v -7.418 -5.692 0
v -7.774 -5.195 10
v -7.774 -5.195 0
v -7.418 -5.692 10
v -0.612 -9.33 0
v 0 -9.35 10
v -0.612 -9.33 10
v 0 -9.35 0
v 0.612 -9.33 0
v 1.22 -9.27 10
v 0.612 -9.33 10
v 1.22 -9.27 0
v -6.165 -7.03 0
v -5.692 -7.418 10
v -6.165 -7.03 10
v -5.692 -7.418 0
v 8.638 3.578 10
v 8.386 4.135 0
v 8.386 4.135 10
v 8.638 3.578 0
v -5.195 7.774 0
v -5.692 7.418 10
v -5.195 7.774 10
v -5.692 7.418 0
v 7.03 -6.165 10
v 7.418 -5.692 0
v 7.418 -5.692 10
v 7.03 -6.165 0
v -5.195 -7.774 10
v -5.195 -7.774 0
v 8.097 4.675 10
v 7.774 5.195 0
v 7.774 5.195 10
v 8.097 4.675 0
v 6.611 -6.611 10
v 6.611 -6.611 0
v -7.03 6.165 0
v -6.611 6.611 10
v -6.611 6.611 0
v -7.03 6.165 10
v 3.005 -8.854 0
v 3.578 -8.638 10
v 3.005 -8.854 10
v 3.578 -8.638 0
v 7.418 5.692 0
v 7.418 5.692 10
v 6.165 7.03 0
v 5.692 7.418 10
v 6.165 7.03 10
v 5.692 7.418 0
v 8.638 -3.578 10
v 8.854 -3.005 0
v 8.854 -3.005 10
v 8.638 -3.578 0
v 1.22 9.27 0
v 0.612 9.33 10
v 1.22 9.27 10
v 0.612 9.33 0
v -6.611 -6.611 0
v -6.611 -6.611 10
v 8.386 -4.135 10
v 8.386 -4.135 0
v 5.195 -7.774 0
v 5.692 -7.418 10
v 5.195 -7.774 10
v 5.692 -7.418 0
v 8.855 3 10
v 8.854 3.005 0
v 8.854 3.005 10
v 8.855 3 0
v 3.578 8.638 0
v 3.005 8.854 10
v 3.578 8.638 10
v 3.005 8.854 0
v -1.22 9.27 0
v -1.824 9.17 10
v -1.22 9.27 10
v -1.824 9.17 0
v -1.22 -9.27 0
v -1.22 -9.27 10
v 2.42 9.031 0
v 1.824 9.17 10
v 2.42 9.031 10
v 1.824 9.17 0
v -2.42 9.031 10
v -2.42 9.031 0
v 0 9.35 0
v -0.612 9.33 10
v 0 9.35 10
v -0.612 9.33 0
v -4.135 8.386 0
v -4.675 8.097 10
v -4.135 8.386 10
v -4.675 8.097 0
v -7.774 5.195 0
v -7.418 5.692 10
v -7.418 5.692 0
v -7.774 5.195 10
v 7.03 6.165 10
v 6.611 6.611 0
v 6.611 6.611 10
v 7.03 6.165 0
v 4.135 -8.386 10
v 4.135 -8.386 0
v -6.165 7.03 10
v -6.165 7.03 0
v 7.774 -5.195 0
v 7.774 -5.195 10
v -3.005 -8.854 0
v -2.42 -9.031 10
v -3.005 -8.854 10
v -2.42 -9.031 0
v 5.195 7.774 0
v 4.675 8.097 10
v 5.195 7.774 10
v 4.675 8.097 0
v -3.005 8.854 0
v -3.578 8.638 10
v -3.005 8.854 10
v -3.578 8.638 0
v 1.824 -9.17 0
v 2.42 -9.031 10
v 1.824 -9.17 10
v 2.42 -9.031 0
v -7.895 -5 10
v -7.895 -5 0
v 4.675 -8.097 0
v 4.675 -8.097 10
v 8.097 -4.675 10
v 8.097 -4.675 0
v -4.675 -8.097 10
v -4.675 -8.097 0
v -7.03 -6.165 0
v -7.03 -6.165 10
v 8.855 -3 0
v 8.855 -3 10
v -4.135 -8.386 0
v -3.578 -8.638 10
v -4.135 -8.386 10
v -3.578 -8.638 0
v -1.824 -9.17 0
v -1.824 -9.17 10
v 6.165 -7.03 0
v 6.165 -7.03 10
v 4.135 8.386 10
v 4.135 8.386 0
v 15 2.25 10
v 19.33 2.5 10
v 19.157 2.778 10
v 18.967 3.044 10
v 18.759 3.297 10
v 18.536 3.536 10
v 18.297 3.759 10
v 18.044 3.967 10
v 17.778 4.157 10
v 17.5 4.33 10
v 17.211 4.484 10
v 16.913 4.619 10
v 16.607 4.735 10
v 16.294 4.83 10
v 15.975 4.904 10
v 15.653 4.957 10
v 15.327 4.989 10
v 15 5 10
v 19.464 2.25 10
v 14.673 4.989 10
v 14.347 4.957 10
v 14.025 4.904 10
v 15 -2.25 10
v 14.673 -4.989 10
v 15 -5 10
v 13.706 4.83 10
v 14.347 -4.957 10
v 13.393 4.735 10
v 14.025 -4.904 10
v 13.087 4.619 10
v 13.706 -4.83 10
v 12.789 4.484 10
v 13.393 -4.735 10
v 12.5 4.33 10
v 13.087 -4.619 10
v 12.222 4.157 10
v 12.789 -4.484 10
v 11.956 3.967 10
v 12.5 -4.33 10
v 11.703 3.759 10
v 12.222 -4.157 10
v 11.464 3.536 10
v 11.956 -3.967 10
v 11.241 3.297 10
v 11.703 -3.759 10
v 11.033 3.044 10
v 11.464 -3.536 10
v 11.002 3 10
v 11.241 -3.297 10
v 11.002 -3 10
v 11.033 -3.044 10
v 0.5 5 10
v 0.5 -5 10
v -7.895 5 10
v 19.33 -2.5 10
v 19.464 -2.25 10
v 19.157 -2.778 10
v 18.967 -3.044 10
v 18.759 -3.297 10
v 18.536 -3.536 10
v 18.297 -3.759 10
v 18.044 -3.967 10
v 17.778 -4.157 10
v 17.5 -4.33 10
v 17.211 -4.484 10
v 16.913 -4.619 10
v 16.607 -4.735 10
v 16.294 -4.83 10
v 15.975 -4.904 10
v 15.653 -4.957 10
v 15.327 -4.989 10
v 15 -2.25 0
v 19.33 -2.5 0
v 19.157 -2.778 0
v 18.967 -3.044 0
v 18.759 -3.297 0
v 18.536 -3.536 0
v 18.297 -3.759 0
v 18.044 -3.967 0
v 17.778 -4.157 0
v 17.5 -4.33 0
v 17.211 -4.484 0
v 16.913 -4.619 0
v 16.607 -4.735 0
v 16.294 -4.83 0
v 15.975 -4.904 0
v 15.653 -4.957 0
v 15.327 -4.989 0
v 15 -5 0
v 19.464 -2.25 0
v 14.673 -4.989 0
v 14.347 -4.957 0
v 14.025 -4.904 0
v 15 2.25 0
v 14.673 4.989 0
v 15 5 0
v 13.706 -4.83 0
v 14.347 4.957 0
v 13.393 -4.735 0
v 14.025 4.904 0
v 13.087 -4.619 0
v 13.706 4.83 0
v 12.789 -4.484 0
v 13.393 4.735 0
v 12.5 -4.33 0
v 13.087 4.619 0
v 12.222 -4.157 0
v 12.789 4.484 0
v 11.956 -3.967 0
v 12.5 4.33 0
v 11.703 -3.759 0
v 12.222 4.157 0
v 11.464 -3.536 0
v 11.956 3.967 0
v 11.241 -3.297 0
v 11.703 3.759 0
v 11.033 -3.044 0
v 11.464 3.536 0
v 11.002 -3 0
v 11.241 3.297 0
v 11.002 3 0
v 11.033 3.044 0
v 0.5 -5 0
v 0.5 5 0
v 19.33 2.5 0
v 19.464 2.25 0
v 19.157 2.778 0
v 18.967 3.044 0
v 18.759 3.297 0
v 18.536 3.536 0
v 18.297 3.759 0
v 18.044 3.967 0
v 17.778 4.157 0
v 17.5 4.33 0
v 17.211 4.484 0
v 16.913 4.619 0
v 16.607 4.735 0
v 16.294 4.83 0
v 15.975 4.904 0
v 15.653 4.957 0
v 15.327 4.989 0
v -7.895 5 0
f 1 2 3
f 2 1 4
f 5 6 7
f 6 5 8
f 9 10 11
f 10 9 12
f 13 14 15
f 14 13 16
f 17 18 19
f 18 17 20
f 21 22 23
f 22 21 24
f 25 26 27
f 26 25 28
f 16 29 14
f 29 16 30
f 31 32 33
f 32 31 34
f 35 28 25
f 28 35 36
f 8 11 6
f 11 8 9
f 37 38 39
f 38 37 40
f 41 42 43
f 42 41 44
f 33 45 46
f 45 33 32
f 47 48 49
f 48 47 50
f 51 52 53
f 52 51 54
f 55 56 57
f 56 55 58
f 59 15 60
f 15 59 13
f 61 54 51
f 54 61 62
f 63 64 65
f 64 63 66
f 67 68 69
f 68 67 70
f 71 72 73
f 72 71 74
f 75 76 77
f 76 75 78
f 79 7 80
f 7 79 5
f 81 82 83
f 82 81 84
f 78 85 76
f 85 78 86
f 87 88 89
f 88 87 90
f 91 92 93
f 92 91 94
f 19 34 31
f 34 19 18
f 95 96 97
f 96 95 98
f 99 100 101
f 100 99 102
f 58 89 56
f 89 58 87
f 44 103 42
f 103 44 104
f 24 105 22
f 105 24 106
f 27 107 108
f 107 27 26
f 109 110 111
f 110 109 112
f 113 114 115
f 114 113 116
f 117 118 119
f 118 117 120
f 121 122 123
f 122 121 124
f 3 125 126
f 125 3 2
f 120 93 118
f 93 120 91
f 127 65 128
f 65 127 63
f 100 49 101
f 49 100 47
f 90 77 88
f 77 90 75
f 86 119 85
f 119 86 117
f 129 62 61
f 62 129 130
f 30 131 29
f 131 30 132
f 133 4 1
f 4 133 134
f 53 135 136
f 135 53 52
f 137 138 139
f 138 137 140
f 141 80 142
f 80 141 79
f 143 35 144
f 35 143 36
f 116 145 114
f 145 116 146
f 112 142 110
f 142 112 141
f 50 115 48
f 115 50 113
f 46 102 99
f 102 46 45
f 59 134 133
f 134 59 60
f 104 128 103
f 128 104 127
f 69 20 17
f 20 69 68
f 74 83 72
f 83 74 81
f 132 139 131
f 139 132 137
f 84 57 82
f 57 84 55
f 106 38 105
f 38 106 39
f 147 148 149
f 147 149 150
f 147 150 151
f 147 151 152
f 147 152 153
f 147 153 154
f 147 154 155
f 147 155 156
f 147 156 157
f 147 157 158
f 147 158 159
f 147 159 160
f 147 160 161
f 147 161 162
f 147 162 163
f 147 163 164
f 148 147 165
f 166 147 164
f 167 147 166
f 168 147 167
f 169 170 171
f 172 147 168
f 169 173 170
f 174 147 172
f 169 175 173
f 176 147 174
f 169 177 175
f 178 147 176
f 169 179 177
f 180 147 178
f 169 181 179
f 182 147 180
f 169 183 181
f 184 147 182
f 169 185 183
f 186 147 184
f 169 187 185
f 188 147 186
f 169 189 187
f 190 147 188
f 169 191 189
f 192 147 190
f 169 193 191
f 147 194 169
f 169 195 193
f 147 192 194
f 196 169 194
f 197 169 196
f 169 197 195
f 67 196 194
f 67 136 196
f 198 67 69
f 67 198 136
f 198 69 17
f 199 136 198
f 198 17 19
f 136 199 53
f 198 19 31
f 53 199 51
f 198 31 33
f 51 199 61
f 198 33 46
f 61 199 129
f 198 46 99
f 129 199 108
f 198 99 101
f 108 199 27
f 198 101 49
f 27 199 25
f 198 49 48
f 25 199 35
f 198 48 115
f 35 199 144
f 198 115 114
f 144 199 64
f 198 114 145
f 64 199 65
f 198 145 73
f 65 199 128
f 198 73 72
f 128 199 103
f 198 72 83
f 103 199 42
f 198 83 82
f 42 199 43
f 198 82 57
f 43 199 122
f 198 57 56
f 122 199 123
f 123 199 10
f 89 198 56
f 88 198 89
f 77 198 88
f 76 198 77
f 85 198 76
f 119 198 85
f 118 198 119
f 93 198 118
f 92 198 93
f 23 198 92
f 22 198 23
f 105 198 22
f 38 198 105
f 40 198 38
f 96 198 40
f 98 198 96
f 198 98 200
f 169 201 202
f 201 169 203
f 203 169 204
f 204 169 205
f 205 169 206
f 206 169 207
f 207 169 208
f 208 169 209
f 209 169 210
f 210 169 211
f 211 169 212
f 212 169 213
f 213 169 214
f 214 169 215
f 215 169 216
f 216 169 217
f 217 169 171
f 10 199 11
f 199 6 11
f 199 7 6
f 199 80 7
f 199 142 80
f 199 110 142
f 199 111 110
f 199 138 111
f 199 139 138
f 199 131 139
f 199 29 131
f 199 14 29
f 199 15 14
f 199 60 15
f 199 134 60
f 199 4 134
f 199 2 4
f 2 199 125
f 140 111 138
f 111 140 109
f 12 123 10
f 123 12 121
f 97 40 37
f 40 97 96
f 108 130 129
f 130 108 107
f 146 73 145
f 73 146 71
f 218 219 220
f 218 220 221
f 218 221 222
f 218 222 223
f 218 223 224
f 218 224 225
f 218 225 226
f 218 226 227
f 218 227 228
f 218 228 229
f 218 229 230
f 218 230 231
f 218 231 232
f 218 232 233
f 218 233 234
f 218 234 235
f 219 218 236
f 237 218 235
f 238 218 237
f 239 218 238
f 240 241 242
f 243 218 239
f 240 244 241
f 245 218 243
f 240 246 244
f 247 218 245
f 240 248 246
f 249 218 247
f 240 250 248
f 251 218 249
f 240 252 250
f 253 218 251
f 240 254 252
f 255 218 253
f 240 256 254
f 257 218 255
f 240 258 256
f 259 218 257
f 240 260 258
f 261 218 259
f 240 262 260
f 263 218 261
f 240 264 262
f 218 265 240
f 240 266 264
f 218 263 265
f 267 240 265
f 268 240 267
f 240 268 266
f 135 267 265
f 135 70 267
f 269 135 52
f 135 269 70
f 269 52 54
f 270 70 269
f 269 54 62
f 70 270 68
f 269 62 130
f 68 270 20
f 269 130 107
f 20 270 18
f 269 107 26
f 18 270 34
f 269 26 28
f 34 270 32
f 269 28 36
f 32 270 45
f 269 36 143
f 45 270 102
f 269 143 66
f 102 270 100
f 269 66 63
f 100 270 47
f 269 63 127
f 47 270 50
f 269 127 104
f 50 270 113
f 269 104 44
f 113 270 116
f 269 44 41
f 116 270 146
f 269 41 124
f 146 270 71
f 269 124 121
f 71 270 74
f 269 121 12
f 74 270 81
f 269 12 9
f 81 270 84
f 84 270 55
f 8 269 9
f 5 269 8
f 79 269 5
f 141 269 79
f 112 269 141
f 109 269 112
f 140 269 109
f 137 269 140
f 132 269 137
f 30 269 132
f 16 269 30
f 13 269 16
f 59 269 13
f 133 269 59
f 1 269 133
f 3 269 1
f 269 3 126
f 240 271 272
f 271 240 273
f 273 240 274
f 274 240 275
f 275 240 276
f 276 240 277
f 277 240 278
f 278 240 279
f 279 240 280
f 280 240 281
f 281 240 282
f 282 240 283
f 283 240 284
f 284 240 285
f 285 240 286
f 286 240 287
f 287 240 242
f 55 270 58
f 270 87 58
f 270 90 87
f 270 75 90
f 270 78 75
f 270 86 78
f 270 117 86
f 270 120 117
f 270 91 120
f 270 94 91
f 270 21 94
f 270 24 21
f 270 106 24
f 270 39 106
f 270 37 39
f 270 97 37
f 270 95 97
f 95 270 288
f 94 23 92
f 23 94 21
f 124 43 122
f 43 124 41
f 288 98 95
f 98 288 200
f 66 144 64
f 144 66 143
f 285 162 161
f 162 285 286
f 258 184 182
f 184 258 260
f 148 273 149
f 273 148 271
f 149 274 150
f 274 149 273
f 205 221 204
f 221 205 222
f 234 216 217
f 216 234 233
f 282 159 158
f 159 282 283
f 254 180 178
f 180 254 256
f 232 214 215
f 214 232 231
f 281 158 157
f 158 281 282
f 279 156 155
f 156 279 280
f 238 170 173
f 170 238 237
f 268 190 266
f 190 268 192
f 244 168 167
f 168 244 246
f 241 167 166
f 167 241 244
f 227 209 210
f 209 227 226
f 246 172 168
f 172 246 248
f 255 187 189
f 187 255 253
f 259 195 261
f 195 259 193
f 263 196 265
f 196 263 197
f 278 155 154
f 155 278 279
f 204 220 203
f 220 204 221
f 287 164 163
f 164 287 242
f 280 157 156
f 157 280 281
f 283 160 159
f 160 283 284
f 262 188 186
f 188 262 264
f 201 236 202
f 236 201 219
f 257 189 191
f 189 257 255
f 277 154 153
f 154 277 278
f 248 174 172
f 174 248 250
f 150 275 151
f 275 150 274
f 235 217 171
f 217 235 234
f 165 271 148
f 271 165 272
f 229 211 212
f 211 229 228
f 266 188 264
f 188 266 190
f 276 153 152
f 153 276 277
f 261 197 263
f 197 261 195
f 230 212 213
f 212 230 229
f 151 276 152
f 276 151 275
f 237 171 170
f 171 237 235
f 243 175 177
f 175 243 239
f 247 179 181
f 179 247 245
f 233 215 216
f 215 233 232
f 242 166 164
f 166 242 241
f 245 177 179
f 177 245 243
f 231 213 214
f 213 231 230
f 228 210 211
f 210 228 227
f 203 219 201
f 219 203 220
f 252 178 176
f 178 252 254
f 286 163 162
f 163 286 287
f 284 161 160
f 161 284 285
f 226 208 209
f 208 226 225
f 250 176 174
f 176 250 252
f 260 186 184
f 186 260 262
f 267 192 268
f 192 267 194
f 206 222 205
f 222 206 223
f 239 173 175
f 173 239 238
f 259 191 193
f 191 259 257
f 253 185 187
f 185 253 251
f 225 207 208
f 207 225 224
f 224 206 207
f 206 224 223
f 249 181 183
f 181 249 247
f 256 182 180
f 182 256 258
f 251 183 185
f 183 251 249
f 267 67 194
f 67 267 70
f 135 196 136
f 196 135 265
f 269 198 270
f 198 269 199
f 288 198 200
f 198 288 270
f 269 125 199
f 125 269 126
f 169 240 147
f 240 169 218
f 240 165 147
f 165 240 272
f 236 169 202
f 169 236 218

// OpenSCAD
// Snap-on tubing clip for a 12.7 mm lab stand rod
// Print orientation: flat on bed, extruded upward in +Z

$fn = 96;

// ---- Dimensions (mm) ----
rod_d        = 12.7;   // stand rod diameter
ring_w       = 3;      // rod ring wall thickness
ring_od      = rod_d + 2 * ring_w;  // rod ring outer diameter (18.7)
opening_w    = 10;     // rod ring opening width along -X
bridge_x0    = 8;      // bridge start (X)
bridge_x1    = 12;     // bridge end (X)
bridge_w     = 6;      // bridge width (Y)
tubing_id    = 6;      // tubing inner diameter
tubing_w     = 2;      // tubing ring wall thickness
tubing_od    = tubing_id + 2 * tubing_w;  // tubing outer diameter (10)
tubing_x     = 15;     // tubing ring centre (X)
tubing_open  = 4.5;    // tubing opening width along +X
height       = 10;     // extrusion height (Z)
eps          = 0.5;    // cutter overshoot past faces

difference() {
    union() {
        // Rod ring
        cylinder(d = ring_od, h = height);
        // Tubing ring
        translate([tubing_x, 0, 0])
            cylinder(d = tubing_od, h = height);
        // Solid bridge between rings
        translate([bridge_x0, -bridge_w / 2, 0])
            cube([bridge_x1 - bridge_x0, bridge_w, height]);
    }
    // Rod ring opening: x < 0, -5 < y < 5
    translate([-ring_od - eps, -opening_w / 2, -eps])
        cube([ring_od + 2 * eps, opening_w, height + 2 * eps]);
    // Tubing opening: x > 15, -2.25 < y < 2.25
    translate([tubing_x, -tubing_open / 2, -eps])
        cube([ring_od + 2 * eps, tubing_open, height + 2 * eps]);
}
